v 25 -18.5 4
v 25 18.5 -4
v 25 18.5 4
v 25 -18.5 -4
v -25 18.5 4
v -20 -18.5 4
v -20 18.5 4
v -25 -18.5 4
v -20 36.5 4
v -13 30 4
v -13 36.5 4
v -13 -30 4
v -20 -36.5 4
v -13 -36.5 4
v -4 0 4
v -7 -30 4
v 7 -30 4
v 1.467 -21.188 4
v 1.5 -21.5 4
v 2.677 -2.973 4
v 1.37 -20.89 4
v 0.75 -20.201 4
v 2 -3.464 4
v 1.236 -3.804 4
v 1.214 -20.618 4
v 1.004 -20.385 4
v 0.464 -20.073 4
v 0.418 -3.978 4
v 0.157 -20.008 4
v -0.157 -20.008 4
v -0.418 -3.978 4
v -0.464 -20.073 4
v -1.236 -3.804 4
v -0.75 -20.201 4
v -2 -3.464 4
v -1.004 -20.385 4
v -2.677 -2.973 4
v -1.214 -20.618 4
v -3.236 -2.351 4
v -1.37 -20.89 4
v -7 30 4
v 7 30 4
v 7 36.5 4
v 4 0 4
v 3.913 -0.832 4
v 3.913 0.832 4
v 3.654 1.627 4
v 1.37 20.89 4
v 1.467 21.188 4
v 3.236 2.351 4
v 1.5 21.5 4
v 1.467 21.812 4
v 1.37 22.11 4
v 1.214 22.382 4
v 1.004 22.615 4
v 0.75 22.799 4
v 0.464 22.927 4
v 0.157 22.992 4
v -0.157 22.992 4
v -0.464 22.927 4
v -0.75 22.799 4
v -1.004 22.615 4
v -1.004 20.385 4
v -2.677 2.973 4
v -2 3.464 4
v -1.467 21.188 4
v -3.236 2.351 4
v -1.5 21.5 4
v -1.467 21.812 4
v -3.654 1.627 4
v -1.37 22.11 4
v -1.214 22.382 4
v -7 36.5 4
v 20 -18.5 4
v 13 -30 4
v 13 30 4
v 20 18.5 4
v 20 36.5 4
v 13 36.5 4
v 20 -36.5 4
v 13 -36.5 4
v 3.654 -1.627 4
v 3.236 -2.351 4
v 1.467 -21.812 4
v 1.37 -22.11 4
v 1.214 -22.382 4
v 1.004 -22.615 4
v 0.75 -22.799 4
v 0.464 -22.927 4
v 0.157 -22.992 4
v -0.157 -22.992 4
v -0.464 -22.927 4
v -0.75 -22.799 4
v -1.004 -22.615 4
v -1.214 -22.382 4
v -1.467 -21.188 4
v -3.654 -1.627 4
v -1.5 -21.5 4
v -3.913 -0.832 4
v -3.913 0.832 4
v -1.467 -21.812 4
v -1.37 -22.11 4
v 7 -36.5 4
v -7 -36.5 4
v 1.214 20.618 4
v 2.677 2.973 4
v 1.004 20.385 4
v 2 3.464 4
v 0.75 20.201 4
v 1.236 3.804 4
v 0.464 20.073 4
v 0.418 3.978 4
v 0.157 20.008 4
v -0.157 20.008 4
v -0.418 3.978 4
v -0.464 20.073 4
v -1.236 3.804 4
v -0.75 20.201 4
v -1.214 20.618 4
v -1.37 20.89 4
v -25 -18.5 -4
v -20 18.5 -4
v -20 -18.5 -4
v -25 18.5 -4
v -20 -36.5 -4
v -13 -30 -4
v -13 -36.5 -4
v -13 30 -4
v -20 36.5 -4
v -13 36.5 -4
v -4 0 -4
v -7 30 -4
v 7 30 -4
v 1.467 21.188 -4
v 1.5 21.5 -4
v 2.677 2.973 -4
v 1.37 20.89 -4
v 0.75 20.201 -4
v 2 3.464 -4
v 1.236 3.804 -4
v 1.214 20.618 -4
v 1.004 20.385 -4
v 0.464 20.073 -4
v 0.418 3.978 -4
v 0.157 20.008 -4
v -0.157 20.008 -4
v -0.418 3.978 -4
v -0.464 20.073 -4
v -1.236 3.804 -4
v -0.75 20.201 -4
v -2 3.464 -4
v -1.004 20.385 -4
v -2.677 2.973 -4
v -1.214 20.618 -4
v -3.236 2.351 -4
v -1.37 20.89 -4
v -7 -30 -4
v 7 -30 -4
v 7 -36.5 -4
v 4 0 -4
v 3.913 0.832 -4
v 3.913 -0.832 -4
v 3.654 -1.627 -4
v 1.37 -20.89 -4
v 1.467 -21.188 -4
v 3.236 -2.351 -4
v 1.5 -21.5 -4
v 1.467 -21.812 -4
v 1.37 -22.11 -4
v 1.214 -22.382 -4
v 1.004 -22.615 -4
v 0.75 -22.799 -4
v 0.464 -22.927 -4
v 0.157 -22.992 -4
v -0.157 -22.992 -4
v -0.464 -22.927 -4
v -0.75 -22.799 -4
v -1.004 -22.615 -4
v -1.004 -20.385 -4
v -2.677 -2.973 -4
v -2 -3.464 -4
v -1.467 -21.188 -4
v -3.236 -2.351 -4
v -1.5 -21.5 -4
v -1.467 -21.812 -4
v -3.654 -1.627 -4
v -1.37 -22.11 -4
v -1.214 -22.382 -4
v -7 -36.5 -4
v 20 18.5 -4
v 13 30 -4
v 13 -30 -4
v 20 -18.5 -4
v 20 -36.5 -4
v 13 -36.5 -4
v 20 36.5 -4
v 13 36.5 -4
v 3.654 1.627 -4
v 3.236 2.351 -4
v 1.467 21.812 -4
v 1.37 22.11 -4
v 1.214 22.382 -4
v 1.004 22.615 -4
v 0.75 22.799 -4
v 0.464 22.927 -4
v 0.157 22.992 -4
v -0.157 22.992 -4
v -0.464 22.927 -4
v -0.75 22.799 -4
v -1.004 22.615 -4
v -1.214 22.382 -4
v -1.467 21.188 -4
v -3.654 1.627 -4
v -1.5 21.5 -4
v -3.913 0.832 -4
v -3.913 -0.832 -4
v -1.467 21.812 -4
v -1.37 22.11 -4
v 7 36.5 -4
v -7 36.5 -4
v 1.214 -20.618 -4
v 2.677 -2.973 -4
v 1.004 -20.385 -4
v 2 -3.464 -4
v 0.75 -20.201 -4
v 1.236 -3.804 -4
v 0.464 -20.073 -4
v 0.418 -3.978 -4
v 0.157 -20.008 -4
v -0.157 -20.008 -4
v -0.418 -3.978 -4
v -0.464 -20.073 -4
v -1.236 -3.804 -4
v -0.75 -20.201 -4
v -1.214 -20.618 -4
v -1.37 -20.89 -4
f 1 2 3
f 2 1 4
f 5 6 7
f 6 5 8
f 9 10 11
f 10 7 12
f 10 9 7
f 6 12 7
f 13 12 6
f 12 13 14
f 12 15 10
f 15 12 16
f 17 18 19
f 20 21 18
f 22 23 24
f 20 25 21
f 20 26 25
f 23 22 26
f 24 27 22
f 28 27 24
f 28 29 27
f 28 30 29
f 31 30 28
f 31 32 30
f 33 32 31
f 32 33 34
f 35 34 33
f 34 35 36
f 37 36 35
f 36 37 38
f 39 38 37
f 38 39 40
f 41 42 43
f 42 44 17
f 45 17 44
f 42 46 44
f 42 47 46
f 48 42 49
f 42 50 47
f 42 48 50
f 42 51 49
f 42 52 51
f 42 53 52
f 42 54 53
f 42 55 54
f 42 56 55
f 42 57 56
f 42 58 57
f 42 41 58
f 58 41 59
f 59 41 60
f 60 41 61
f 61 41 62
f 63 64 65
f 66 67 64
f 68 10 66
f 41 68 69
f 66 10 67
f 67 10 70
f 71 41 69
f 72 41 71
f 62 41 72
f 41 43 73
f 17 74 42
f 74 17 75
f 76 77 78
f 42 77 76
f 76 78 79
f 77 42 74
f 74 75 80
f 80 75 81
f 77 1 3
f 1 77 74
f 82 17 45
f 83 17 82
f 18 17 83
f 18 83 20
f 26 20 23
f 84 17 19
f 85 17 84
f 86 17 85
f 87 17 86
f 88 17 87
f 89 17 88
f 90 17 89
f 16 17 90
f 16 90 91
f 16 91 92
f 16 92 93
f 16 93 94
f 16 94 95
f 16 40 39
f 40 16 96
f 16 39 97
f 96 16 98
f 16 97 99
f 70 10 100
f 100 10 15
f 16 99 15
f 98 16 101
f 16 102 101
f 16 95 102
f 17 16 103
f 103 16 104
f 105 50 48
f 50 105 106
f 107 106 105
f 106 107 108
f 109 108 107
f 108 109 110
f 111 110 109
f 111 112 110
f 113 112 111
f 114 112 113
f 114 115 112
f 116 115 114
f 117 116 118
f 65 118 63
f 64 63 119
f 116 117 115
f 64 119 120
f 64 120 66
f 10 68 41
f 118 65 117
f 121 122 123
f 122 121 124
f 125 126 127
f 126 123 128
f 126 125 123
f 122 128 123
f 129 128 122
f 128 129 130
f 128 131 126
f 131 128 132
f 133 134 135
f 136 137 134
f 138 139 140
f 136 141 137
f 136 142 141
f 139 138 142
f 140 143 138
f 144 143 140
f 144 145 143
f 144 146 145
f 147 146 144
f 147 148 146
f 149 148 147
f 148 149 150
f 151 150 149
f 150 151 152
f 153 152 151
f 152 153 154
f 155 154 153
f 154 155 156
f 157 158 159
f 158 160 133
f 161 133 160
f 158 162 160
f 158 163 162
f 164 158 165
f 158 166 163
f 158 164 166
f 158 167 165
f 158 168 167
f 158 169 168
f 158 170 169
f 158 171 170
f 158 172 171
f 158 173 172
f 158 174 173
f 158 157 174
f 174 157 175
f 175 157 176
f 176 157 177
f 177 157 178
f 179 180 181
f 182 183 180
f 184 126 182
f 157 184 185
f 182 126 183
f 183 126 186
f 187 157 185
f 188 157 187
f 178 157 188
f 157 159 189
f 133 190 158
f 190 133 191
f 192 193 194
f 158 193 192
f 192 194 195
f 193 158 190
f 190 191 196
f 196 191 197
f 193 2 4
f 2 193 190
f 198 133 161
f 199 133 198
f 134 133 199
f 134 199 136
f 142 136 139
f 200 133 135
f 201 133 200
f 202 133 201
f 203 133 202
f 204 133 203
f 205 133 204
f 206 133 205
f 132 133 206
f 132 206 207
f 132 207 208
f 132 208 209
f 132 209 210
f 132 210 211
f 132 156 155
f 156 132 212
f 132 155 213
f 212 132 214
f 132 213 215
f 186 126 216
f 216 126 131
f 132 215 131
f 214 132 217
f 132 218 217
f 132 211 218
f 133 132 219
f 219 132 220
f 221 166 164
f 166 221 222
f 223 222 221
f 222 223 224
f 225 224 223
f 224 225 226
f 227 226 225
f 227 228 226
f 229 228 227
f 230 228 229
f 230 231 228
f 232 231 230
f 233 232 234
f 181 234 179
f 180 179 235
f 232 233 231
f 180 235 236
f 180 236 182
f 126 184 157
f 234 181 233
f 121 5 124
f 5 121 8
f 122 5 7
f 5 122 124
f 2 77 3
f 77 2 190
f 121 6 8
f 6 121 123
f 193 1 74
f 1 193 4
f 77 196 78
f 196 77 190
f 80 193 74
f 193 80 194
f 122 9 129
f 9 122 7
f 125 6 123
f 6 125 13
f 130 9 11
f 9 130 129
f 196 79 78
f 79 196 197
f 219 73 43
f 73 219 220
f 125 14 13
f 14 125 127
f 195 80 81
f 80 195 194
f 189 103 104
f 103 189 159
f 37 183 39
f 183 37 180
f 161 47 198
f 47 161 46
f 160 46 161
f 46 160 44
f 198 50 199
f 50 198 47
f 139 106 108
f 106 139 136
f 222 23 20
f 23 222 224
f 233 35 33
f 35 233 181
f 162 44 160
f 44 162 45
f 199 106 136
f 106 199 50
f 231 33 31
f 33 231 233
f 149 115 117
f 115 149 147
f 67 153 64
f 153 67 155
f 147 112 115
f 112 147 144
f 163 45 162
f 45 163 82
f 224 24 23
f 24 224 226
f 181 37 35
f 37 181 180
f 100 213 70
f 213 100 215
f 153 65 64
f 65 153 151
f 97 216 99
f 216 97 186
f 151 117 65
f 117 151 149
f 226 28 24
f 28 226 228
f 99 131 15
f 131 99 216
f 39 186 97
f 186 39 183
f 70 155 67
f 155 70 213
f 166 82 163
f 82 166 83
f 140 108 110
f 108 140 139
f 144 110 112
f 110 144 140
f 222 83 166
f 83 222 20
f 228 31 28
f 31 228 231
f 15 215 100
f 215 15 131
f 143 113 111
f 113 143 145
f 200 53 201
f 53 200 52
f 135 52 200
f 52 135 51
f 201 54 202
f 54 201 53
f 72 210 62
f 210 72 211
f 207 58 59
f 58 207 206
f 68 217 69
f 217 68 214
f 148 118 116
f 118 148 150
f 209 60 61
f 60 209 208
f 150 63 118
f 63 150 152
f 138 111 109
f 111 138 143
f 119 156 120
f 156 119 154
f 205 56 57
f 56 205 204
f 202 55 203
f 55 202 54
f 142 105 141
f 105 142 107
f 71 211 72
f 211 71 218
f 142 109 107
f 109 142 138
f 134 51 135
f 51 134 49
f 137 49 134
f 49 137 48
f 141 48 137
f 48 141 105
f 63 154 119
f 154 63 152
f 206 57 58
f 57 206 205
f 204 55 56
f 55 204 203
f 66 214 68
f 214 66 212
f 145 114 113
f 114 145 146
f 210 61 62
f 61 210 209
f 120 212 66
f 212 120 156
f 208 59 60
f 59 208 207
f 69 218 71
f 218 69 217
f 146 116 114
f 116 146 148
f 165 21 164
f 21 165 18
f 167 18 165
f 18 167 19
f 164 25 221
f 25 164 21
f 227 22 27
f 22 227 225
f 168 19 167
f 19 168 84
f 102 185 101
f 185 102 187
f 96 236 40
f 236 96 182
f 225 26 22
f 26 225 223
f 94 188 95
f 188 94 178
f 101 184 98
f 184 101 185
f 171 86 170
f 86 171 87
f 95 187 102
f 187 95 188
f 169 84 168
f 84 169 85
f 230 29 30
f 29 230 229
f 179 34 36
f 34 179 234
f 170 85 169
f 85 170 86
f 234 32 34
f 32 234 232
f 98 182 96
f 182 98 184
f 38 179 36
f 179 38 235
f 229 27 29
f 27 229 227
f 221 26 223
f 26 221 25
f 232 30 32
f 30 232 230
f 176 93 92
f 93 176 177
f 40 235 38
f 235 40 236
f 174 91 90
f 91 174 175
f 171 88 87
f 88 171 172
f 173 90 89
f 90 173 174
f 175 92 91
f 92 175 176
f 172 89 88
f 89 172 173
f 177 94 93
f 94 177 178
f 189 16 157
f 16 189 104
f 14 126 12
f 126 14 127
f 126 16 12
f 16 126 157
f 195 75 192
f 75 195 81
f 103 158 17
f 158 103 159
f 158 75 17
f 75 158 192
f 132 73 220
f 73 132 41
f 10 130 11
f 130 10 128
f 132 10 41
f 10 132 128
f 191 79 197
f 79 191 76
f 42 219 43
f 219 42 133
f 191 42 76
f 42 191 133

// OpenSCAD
$fn=30;
DELTA=0.1;
difference() {
union() {
    cube([50,37,8],true);
    cube([40,73,8],true);
}
    translate([-10,-33.25-DELTA/2,0])cube([6,6.5+DELTA,8+DELTA],true);
    translate([10,-33.25-DELTA/2,0])cube([6,6.5+DELTA,8+DELTA],true);
    translate([-10,33.25+DELTA/2,0])cube([6,6.5+DELTA,8+DELTA],true);
    translate([10,33.25+DELTA/2,0])cube([6,6.5+DELTA,8+DELTA],true);
    translate([0,0,-4-DELTA]){
        cylinder(r=4,h=8+DELTA*2);
        translate([0,73/2-15,0])cylinder(r=1.5,h=8+DELTA*2);
        translate([0,-(73/2-15),0])cylinder(r=1.5,h=8+DELTA*2);
    }
}
